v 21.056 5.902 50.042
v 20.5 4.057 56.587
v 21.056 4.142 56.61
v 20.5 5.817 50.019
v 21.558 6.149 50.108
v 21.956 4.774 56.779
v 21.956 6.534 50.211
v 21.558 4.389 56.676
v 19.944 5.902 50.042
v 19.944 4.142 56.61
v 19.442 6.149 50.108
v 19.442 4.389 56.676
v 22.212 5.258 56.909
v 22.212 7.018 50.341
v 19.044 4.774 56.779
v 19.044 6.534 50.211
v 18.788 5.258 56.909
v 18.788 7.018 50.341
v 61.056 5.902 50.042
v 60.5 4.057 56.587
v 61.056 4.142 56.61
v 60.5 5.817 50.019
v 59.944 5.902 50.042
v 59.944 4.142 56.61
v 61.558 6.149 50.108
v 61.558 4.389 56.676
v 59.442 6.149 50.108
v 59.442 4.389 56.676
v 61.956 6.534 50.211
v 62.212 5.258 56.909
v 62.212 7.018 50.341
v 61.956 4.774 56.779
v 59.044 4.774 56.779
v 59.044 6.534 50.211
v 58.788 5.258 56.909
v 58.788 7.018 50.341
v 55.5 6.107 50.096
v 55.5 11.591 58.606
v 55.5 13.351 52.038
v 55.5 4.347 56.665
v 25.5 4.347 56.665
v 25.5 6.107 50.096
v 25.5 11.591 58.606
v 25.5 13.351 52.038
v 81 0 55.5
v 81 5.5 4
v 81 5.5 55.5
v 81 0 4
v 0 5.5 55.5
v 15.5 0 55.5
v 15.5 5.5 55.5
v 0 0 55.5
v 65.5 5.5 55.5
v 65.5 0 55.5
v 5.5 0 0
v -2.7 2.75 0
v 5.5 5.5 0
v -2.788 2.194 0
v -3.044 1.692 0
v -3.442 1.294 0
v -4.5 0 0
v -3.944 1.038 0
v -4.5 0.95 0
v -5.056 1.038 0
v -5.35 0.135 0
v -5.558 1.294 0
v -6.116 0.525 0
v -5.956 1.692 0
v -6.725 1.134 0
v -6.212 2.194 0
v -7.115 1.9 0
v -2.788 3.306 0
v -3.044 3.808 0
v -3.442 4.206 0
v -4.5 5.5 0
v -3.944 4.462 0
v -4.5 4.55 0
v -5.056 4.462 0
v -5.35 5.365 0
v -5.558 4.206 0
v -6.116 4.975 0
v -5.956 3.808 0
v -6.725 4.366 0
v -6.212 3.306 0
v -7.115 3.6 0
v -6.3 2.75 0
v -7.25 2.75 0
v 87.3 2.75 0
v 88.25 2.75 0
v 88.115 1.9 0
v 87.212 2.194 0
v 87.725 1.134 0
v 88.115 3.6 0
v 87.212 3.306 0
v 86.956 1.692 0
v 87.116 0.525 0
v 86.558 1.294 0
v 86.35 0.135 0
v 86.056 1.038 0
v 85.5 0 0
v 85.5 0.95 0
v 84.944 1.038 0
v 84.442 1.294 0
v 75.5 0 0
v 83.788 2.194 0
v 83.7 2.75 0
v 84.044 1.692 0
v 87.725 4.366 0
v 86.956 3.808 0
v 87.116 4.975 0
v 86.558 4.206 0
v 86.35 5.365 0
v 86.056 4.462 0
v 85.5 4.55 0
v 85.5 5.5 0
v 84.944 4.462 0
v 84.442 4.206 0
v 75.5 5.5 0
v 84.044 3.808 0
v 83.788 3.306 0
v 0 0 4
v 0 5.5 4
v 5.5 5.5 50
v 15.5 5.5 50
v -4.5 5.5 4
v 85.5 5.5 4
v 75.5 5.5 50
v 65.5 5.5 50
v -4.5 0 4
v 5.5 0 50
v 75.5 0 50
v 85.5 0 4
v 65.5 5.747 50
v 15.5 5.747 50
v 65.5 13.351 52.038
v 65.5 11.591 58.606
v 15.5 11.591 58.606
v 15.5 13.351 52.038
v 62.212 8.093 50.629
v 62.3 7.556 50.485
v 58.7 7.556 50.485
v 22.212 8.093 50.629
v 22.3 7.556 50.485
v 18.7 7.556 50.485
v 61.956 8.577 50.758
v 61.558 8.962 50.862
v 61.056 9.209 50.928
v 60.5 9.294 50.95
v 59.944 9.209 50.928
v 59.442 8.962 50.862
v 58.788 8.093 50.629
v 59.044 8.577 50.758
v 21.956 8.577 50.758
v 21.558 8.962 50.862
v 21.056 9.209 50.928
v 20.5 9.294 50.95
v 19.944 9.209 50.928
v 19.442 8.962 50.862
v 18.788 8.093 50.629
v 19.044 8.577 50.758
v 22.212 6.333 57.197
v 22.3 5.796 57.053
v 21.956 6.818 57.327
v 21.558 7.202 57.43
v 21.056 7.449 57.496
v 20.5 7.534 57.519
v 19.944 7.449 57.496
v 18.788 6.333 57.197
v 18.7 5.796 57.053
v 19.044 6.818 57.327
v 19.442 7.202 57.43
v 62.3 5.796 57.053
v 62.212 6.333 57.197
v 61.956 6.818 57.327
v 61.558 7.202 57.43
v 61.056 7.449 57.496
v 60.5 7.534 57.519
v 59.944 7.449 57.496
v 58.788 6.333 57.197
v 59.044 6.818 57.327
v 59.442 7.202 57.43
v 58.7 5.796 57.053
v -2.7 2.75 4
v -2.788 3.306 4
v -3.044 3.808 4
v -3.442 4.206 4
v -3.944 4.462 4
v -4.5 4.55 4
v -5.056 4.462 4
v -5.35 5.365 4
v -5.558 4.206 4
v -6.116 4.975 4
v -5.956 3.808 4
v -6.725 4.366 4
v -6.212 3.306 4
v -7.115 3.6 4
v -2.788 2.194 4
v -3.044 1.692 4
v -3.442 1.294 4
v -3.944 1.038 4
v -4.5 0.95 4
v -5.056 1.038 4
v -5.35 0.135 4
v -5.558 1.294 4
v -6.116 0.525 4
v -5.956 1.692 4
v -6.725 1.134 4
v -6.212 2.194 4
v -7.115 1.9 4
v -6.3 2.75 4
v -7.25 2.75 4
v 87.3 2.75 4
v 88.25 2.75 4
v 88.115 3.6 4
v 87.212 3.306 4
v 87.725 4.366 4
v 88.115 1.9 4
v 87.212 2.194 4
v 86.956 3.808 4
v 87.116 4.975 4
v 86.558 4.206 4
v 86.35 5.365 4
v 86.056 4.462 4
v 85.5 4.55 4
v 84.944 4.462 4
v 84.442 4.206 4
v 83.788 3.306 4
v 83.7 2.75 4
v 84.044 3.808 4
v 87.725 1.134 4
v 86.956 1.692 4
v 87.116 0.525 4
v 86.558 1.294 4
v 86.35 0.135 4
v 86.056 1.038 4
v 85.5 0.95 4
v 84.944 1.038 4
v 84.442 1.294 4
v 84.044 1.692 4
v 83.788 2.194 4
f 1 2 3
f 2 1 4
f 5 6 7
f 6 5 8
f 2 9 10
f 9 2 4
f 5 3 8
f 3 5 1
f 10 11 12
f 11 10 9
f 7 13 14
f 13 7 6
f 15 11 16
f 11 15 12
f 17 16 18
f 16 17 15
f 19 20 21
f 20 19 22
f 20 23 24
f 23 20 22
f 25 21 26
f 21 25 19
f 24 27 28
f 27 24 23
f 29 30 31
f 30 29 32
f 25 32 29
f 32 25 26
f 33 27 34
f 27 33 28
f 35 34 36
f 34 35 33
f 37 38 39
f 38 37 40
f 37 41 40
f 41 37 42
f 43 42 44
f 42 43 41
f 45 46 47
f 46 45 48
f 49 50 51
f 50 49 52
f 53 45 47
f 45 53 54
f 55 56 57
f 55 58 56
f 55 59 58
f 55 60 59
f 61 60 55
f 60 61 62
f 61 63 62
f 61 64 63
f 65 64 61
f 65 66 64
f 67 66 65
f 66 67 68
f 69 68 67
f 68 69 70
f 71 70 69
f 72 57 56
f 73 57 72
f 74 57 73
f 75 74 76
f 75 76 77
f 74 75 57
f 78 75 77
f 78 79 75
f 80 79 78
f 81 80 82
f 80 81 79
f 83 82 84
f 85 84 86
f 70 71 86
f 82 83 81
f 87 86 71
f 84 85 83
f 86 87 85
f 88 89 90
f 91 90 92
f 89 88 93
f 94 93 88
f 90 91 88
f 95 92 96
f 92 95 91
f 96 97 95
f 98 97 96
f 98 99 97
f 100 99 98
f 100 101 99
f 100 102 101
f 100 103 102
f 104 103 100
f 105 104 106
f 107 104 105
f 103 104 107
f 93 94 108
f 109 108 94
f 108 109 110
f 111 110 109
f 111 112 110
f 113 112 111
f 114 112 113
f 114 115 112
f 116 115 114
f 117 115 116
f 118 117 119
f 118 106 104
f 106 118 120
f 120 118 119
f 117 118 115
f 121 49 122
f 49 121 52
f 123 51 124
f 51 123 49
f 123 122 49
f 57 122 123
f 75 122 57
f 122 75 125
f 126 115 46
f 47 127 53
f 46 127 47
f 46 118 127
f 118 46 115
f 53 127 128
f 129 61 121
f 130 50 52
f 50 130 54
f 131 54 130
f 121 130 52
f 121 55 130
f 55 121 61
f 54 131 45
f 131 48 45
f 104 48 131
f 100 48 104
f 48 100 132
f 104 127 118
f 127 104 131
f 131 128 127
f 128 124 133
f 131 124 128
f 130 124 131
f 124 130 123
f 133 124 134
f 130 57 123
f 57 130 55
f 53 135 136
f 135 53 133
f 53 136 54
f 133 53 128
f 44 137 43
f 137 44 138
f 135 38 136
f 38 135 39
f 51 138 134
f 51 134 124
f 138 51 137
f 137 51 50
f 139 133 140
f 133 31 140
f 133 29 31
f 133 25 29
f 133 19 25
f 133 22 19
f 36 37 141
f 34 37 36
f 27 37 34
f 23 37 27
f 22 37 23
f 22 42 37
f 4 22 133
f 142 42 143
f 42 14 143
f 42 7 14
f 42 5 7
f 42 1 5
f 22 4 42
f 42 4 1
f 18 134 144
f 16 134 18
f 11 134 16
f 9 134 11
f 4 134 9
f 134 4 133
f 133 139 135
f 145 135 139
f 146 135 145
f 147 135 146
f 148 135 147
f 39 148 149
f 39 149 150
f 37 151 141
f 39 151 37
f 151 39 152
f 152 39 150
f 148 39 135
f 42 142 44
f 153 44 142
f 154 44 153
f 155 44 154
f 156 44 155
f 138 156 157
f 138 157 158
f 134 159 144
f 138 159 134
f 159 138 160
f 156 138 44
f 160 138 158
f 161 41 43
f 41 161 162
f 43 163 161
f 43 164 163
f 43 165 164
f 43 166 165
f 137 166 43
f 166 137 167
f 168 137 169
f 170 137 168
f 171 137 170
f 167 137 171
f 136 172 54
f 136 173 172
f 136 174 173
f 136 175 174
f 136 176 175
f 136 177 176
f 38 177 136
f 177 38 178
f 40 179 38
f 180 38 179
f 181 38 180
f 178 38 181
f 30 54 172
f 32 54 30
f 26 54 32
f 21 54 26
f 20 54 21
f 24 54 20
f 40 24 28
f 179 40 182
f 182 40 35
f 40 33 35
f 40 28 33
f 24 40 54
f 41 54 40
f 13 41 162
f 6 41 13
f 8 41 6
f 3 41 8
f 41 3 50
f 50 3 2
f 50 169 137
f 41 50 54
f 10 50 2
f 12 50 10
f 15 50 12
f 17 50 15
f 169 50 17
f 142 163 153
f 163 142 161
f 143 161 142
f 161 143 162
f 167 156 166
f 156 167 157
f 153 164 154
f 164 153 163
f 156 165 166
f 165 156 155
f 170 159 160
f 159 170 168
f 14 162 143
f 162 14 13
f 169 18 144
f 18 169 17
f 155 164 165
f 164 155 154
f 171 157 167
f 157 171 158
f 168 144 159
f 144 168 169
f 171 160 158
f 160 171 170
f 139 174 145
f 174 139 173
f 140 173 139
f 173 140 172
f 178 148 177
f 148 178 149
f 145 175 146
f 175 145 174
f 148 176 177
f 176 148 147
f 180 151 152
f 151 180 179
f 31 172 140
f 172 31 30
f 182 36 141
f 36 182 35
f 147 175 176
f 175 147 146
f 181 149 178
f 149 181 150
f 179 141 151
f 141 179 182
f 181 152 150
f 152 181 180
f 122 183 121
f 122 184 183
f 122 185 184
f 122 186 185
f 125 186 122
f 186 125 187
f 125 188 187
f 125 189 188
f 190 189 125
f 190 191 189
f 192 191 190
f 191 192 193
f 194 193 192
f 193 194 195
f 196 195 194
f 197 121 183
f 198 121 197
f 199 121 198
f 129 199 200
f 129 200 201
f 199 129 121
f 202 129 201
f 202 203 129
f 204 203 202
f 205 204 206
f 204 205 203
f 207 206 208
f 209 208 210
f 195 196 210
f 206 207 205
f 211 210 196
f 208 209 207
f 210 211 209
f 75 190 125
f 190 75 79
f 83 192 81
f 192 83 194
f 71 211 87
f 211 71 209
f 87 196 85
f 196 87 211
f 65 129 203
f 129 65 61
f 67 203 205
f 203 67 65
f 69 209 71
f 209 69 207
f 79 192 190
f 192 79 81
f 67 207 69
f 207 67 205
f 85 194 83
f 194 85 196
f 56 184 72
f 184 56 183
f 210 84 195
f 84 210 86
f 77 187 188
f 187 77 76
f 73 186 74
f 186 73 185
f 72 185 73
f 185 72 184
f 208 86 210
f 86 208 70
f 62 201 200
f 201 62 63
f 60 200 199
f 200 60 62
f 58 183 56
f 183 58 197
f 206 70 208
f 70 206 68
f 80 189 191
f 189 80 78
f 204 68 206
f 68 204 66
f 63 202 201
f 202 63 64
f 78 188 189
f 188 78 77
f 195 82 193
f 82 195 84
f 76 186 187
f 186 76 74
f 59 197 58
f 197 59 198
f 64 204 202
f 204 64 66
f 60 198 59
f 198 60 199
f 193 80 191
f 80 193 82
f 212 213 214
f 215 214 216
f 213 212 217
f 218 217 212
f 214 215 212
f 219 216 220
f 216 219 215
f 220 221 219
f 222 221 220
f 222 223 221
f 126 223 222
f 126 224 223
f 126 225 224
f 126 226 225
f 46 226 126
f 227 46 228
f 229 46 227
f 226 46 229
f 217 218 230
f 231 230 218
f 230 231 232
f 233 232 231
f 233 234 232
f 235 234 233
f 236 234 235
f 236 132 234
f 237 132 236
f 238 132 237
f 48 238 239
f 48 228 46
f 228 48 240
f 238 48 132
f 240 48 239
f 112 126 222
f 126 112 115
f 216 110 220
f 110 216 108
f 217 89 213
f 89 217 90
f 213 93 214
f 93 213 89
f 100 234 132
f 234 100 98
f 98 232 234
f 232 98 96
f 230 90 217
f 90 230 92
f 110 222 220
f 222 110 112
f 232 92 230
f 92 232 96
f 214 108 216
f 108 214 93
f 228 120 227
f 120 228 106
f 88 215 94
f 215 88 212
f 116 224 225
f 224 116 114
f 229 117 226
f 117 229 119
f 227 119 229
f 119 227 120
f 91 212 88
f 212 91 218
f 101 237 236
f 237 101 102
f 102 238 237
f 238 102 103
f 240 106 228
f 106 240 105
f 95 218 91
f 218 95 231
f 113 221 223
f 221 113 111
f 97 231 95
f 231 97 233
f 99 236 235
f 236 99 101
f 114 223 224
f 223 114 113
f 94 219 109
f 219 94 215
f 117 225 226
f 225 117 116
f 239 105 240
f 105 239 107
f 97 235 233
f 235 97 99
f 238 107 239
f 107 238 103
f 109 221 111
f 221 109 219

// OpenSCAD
// Dimensões da base:
h_b = 50;
w_b = 70;
l_b = 5.5;

// Dimensões do suporte do ventilador:
h_s = 12;
h_dist = 40;
w_s = 50;
p_s = 6.8;
t_s = -75;

render( convexity = 10 ){
    
    // Base:
    difference(){
        cube( [ w_b + 2 * l_b, l_b, h_b + l_b ] );
        translate( [ l_b, -1, -1 ] )
            cube( [ w_b, l_b + 2, h_b + 1 ] );
        
        translate( [ 0, 0, h_b + l_b ] )
            rotate( t_s, [ 1, 0, 0 ] )
                translate( [ ( w_b + 2 * l_b - w_s ) / 2, 0, 0 ] ){
                        translate( [ ( w_s - h_dist ) / 2, h_s + 1, h_s / 2 ] )
                            rotate( 90, [ 1, 0, 0 ] )
                                cylinder( r = 1.8, h = h_s + 2, $fn = 20 );
                        translate( [ w_s - ( w_s - h_dist ) / 2, h_s + 1, h_s / 2 ] )
                            rotate( 90, [ 1, 0, 0 ] )
                                cylinder( r = 1.8, h = h_s + 2, $fn = 20 );
                        translate( [ w_s - h_dist, -1, 4.5 ] )
                            cube( [ h_dist - 2 * ( w_s - h_dist ) / 2, h_s, 20 ] );
                    }
    }
    
    // Suporte do ventilador:
    difference(){
        translate( [ 0, 0, h_b + l_b ] )
            rotate( t_s, [ 1, 0, 0 ] )
                translate( [ ( w_b + 2 * l_b - w_s ) / 2, 0, 0 ] )
                    difference(){
                        cube( [ w_s, p_s, h_s ] );
    
                        translate( [ ( w_s - h_dist ) / 2, h_s + 1, h_s / 2 ] )
                            rotate( 90, [ 1, 0, 0 ] )
                                cylinder( r = 1.8, h = h_s + 2, $fn = 20 );
                        translate( [ w_s - ( w_s - h_dist ) / 2, h_s + 1, h_s / 2 ] )
                            rotate( 90, [ 1, 0, 0 ] )
                                cylinder( r = 1.8, h = h_s + 2, $fn = 20 );
                        
                        translate( [ w_s - h_dist, -1, 4.5 ] )
                            cube( [ h_dist - 2 * ( w_s - h_dist ) / 2, h_s, 20 ] );
                    }
            translate( [ l_b, -1, -1 ] )
                cube( [ w_b, l_b + 2, h_b + 1 ] );
    }
    
    // Bases de parafusamento:
    translate( [ - l_b + 1, 0, 0 ] )
        difference(){
            union(){
                cube( [ 3.6 + 5, l_b, 4 ] );
                translate( [ 0, l_b  / 2, 0 ] )
                    cylinder( r = l_b / 2, h = 4, $fn = 20 );
            }
            translate( [ 0, l_b  / 2, -1 ] )
                cylinder( r = 1.8, h = 6, $fn = 20 );
        }

    translate( [ w_b + 2 * l_b, 0, 0 ] )
    mirror( [ 1, 0, 0 ] )
    translate( [ - l_b + 1, 0, 0 ] )
        difference(){
            union(){
                cube( [ 3.6 + 5, l_b, 4 ] );
                translate( [ 0, l_b  / 2, 0 ] )
                    cylinder( r = l_b / 2, h = 4, $fn = 20 );
            }
            translate( [ 0, l_b  / 2, -1 ] )
                cylinder( r = 1.8, h = 6, $fn = 20 );
        }

}
